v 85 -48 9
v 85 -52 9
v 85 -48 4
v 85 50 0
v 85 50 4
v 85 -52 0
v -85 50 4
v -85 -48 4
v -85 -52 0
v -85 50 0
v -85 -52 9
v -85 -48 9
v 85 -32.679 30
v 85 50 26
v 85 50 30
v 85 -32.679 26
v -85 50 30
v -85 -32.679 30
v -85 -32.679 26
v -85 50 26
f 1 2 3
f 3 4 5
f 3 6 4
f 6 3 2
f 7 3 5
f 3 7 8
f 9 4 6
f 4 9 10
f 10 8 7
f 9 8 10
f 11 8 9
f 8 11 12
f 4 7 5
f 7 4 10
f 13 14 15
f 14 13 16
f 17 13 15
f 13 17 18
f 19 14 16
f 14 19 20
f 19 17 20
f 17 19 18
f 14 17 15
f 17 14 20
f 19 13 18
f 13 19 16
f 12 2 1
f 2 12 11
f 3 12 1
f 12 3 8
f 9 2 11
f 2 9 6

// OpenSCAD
//
//config
//
thickness = 4;
size = [170, 100, 30];
frontHeight = 9;
frontDistance = 4;
angle = 30;



//
//code
//
sizeDiff = size[2] / tan(90 - angle);

module toWall(points, offset)
{

	points2 = [for(p = points) [
		p[0] + offset[0],
		p[1] + offset[1],
		p[2] + offset[2],
	]];

	count = len(points);
	face1 = [for(i = [0 : count - 1]) i];
	face2 = [for(i = [0 : count - 1]) i + count];
	faces = [for(i = [0 : count - 1]) i == 0
				? [count - 1, 0, count, count + count - 1]
				: [i - 1, i, i + count, i + count - 1]
			];

	polyhedron(concat(points, points2), concat([face1], [face2], faces));
}

module drawSide(thick)
{
	toWall([
		[0, -size[1] / 2 + frontDistance, 0],
		[0, size[1] / 2, 0],
		[0, size[1] / 2, size[2]],
		[0, -size[1] / 2 + sizeDiff, size[2]],
	],
	[thick, 0, 0]);
}

//floor
translate([0, 0, thickness / 2])
	cube([size[0], size[1], thickness], true);

//roof
translate([0, sizeDiff / 2, size[2] - thickness / 2])
	cube([size[0], size[1] - sizeDiff, thickness], true);

//front
translate([0, -size[1] / 2, frontHeight / 2])
	cube([size[0], thickness, frontHeight], true);

//side X+
translate([size[0] / 2, 0, 0])
	drawSide(-thickness);

//side X-
translate([-size[0] / 2, 0, 0])
	drawSide(thickness);
